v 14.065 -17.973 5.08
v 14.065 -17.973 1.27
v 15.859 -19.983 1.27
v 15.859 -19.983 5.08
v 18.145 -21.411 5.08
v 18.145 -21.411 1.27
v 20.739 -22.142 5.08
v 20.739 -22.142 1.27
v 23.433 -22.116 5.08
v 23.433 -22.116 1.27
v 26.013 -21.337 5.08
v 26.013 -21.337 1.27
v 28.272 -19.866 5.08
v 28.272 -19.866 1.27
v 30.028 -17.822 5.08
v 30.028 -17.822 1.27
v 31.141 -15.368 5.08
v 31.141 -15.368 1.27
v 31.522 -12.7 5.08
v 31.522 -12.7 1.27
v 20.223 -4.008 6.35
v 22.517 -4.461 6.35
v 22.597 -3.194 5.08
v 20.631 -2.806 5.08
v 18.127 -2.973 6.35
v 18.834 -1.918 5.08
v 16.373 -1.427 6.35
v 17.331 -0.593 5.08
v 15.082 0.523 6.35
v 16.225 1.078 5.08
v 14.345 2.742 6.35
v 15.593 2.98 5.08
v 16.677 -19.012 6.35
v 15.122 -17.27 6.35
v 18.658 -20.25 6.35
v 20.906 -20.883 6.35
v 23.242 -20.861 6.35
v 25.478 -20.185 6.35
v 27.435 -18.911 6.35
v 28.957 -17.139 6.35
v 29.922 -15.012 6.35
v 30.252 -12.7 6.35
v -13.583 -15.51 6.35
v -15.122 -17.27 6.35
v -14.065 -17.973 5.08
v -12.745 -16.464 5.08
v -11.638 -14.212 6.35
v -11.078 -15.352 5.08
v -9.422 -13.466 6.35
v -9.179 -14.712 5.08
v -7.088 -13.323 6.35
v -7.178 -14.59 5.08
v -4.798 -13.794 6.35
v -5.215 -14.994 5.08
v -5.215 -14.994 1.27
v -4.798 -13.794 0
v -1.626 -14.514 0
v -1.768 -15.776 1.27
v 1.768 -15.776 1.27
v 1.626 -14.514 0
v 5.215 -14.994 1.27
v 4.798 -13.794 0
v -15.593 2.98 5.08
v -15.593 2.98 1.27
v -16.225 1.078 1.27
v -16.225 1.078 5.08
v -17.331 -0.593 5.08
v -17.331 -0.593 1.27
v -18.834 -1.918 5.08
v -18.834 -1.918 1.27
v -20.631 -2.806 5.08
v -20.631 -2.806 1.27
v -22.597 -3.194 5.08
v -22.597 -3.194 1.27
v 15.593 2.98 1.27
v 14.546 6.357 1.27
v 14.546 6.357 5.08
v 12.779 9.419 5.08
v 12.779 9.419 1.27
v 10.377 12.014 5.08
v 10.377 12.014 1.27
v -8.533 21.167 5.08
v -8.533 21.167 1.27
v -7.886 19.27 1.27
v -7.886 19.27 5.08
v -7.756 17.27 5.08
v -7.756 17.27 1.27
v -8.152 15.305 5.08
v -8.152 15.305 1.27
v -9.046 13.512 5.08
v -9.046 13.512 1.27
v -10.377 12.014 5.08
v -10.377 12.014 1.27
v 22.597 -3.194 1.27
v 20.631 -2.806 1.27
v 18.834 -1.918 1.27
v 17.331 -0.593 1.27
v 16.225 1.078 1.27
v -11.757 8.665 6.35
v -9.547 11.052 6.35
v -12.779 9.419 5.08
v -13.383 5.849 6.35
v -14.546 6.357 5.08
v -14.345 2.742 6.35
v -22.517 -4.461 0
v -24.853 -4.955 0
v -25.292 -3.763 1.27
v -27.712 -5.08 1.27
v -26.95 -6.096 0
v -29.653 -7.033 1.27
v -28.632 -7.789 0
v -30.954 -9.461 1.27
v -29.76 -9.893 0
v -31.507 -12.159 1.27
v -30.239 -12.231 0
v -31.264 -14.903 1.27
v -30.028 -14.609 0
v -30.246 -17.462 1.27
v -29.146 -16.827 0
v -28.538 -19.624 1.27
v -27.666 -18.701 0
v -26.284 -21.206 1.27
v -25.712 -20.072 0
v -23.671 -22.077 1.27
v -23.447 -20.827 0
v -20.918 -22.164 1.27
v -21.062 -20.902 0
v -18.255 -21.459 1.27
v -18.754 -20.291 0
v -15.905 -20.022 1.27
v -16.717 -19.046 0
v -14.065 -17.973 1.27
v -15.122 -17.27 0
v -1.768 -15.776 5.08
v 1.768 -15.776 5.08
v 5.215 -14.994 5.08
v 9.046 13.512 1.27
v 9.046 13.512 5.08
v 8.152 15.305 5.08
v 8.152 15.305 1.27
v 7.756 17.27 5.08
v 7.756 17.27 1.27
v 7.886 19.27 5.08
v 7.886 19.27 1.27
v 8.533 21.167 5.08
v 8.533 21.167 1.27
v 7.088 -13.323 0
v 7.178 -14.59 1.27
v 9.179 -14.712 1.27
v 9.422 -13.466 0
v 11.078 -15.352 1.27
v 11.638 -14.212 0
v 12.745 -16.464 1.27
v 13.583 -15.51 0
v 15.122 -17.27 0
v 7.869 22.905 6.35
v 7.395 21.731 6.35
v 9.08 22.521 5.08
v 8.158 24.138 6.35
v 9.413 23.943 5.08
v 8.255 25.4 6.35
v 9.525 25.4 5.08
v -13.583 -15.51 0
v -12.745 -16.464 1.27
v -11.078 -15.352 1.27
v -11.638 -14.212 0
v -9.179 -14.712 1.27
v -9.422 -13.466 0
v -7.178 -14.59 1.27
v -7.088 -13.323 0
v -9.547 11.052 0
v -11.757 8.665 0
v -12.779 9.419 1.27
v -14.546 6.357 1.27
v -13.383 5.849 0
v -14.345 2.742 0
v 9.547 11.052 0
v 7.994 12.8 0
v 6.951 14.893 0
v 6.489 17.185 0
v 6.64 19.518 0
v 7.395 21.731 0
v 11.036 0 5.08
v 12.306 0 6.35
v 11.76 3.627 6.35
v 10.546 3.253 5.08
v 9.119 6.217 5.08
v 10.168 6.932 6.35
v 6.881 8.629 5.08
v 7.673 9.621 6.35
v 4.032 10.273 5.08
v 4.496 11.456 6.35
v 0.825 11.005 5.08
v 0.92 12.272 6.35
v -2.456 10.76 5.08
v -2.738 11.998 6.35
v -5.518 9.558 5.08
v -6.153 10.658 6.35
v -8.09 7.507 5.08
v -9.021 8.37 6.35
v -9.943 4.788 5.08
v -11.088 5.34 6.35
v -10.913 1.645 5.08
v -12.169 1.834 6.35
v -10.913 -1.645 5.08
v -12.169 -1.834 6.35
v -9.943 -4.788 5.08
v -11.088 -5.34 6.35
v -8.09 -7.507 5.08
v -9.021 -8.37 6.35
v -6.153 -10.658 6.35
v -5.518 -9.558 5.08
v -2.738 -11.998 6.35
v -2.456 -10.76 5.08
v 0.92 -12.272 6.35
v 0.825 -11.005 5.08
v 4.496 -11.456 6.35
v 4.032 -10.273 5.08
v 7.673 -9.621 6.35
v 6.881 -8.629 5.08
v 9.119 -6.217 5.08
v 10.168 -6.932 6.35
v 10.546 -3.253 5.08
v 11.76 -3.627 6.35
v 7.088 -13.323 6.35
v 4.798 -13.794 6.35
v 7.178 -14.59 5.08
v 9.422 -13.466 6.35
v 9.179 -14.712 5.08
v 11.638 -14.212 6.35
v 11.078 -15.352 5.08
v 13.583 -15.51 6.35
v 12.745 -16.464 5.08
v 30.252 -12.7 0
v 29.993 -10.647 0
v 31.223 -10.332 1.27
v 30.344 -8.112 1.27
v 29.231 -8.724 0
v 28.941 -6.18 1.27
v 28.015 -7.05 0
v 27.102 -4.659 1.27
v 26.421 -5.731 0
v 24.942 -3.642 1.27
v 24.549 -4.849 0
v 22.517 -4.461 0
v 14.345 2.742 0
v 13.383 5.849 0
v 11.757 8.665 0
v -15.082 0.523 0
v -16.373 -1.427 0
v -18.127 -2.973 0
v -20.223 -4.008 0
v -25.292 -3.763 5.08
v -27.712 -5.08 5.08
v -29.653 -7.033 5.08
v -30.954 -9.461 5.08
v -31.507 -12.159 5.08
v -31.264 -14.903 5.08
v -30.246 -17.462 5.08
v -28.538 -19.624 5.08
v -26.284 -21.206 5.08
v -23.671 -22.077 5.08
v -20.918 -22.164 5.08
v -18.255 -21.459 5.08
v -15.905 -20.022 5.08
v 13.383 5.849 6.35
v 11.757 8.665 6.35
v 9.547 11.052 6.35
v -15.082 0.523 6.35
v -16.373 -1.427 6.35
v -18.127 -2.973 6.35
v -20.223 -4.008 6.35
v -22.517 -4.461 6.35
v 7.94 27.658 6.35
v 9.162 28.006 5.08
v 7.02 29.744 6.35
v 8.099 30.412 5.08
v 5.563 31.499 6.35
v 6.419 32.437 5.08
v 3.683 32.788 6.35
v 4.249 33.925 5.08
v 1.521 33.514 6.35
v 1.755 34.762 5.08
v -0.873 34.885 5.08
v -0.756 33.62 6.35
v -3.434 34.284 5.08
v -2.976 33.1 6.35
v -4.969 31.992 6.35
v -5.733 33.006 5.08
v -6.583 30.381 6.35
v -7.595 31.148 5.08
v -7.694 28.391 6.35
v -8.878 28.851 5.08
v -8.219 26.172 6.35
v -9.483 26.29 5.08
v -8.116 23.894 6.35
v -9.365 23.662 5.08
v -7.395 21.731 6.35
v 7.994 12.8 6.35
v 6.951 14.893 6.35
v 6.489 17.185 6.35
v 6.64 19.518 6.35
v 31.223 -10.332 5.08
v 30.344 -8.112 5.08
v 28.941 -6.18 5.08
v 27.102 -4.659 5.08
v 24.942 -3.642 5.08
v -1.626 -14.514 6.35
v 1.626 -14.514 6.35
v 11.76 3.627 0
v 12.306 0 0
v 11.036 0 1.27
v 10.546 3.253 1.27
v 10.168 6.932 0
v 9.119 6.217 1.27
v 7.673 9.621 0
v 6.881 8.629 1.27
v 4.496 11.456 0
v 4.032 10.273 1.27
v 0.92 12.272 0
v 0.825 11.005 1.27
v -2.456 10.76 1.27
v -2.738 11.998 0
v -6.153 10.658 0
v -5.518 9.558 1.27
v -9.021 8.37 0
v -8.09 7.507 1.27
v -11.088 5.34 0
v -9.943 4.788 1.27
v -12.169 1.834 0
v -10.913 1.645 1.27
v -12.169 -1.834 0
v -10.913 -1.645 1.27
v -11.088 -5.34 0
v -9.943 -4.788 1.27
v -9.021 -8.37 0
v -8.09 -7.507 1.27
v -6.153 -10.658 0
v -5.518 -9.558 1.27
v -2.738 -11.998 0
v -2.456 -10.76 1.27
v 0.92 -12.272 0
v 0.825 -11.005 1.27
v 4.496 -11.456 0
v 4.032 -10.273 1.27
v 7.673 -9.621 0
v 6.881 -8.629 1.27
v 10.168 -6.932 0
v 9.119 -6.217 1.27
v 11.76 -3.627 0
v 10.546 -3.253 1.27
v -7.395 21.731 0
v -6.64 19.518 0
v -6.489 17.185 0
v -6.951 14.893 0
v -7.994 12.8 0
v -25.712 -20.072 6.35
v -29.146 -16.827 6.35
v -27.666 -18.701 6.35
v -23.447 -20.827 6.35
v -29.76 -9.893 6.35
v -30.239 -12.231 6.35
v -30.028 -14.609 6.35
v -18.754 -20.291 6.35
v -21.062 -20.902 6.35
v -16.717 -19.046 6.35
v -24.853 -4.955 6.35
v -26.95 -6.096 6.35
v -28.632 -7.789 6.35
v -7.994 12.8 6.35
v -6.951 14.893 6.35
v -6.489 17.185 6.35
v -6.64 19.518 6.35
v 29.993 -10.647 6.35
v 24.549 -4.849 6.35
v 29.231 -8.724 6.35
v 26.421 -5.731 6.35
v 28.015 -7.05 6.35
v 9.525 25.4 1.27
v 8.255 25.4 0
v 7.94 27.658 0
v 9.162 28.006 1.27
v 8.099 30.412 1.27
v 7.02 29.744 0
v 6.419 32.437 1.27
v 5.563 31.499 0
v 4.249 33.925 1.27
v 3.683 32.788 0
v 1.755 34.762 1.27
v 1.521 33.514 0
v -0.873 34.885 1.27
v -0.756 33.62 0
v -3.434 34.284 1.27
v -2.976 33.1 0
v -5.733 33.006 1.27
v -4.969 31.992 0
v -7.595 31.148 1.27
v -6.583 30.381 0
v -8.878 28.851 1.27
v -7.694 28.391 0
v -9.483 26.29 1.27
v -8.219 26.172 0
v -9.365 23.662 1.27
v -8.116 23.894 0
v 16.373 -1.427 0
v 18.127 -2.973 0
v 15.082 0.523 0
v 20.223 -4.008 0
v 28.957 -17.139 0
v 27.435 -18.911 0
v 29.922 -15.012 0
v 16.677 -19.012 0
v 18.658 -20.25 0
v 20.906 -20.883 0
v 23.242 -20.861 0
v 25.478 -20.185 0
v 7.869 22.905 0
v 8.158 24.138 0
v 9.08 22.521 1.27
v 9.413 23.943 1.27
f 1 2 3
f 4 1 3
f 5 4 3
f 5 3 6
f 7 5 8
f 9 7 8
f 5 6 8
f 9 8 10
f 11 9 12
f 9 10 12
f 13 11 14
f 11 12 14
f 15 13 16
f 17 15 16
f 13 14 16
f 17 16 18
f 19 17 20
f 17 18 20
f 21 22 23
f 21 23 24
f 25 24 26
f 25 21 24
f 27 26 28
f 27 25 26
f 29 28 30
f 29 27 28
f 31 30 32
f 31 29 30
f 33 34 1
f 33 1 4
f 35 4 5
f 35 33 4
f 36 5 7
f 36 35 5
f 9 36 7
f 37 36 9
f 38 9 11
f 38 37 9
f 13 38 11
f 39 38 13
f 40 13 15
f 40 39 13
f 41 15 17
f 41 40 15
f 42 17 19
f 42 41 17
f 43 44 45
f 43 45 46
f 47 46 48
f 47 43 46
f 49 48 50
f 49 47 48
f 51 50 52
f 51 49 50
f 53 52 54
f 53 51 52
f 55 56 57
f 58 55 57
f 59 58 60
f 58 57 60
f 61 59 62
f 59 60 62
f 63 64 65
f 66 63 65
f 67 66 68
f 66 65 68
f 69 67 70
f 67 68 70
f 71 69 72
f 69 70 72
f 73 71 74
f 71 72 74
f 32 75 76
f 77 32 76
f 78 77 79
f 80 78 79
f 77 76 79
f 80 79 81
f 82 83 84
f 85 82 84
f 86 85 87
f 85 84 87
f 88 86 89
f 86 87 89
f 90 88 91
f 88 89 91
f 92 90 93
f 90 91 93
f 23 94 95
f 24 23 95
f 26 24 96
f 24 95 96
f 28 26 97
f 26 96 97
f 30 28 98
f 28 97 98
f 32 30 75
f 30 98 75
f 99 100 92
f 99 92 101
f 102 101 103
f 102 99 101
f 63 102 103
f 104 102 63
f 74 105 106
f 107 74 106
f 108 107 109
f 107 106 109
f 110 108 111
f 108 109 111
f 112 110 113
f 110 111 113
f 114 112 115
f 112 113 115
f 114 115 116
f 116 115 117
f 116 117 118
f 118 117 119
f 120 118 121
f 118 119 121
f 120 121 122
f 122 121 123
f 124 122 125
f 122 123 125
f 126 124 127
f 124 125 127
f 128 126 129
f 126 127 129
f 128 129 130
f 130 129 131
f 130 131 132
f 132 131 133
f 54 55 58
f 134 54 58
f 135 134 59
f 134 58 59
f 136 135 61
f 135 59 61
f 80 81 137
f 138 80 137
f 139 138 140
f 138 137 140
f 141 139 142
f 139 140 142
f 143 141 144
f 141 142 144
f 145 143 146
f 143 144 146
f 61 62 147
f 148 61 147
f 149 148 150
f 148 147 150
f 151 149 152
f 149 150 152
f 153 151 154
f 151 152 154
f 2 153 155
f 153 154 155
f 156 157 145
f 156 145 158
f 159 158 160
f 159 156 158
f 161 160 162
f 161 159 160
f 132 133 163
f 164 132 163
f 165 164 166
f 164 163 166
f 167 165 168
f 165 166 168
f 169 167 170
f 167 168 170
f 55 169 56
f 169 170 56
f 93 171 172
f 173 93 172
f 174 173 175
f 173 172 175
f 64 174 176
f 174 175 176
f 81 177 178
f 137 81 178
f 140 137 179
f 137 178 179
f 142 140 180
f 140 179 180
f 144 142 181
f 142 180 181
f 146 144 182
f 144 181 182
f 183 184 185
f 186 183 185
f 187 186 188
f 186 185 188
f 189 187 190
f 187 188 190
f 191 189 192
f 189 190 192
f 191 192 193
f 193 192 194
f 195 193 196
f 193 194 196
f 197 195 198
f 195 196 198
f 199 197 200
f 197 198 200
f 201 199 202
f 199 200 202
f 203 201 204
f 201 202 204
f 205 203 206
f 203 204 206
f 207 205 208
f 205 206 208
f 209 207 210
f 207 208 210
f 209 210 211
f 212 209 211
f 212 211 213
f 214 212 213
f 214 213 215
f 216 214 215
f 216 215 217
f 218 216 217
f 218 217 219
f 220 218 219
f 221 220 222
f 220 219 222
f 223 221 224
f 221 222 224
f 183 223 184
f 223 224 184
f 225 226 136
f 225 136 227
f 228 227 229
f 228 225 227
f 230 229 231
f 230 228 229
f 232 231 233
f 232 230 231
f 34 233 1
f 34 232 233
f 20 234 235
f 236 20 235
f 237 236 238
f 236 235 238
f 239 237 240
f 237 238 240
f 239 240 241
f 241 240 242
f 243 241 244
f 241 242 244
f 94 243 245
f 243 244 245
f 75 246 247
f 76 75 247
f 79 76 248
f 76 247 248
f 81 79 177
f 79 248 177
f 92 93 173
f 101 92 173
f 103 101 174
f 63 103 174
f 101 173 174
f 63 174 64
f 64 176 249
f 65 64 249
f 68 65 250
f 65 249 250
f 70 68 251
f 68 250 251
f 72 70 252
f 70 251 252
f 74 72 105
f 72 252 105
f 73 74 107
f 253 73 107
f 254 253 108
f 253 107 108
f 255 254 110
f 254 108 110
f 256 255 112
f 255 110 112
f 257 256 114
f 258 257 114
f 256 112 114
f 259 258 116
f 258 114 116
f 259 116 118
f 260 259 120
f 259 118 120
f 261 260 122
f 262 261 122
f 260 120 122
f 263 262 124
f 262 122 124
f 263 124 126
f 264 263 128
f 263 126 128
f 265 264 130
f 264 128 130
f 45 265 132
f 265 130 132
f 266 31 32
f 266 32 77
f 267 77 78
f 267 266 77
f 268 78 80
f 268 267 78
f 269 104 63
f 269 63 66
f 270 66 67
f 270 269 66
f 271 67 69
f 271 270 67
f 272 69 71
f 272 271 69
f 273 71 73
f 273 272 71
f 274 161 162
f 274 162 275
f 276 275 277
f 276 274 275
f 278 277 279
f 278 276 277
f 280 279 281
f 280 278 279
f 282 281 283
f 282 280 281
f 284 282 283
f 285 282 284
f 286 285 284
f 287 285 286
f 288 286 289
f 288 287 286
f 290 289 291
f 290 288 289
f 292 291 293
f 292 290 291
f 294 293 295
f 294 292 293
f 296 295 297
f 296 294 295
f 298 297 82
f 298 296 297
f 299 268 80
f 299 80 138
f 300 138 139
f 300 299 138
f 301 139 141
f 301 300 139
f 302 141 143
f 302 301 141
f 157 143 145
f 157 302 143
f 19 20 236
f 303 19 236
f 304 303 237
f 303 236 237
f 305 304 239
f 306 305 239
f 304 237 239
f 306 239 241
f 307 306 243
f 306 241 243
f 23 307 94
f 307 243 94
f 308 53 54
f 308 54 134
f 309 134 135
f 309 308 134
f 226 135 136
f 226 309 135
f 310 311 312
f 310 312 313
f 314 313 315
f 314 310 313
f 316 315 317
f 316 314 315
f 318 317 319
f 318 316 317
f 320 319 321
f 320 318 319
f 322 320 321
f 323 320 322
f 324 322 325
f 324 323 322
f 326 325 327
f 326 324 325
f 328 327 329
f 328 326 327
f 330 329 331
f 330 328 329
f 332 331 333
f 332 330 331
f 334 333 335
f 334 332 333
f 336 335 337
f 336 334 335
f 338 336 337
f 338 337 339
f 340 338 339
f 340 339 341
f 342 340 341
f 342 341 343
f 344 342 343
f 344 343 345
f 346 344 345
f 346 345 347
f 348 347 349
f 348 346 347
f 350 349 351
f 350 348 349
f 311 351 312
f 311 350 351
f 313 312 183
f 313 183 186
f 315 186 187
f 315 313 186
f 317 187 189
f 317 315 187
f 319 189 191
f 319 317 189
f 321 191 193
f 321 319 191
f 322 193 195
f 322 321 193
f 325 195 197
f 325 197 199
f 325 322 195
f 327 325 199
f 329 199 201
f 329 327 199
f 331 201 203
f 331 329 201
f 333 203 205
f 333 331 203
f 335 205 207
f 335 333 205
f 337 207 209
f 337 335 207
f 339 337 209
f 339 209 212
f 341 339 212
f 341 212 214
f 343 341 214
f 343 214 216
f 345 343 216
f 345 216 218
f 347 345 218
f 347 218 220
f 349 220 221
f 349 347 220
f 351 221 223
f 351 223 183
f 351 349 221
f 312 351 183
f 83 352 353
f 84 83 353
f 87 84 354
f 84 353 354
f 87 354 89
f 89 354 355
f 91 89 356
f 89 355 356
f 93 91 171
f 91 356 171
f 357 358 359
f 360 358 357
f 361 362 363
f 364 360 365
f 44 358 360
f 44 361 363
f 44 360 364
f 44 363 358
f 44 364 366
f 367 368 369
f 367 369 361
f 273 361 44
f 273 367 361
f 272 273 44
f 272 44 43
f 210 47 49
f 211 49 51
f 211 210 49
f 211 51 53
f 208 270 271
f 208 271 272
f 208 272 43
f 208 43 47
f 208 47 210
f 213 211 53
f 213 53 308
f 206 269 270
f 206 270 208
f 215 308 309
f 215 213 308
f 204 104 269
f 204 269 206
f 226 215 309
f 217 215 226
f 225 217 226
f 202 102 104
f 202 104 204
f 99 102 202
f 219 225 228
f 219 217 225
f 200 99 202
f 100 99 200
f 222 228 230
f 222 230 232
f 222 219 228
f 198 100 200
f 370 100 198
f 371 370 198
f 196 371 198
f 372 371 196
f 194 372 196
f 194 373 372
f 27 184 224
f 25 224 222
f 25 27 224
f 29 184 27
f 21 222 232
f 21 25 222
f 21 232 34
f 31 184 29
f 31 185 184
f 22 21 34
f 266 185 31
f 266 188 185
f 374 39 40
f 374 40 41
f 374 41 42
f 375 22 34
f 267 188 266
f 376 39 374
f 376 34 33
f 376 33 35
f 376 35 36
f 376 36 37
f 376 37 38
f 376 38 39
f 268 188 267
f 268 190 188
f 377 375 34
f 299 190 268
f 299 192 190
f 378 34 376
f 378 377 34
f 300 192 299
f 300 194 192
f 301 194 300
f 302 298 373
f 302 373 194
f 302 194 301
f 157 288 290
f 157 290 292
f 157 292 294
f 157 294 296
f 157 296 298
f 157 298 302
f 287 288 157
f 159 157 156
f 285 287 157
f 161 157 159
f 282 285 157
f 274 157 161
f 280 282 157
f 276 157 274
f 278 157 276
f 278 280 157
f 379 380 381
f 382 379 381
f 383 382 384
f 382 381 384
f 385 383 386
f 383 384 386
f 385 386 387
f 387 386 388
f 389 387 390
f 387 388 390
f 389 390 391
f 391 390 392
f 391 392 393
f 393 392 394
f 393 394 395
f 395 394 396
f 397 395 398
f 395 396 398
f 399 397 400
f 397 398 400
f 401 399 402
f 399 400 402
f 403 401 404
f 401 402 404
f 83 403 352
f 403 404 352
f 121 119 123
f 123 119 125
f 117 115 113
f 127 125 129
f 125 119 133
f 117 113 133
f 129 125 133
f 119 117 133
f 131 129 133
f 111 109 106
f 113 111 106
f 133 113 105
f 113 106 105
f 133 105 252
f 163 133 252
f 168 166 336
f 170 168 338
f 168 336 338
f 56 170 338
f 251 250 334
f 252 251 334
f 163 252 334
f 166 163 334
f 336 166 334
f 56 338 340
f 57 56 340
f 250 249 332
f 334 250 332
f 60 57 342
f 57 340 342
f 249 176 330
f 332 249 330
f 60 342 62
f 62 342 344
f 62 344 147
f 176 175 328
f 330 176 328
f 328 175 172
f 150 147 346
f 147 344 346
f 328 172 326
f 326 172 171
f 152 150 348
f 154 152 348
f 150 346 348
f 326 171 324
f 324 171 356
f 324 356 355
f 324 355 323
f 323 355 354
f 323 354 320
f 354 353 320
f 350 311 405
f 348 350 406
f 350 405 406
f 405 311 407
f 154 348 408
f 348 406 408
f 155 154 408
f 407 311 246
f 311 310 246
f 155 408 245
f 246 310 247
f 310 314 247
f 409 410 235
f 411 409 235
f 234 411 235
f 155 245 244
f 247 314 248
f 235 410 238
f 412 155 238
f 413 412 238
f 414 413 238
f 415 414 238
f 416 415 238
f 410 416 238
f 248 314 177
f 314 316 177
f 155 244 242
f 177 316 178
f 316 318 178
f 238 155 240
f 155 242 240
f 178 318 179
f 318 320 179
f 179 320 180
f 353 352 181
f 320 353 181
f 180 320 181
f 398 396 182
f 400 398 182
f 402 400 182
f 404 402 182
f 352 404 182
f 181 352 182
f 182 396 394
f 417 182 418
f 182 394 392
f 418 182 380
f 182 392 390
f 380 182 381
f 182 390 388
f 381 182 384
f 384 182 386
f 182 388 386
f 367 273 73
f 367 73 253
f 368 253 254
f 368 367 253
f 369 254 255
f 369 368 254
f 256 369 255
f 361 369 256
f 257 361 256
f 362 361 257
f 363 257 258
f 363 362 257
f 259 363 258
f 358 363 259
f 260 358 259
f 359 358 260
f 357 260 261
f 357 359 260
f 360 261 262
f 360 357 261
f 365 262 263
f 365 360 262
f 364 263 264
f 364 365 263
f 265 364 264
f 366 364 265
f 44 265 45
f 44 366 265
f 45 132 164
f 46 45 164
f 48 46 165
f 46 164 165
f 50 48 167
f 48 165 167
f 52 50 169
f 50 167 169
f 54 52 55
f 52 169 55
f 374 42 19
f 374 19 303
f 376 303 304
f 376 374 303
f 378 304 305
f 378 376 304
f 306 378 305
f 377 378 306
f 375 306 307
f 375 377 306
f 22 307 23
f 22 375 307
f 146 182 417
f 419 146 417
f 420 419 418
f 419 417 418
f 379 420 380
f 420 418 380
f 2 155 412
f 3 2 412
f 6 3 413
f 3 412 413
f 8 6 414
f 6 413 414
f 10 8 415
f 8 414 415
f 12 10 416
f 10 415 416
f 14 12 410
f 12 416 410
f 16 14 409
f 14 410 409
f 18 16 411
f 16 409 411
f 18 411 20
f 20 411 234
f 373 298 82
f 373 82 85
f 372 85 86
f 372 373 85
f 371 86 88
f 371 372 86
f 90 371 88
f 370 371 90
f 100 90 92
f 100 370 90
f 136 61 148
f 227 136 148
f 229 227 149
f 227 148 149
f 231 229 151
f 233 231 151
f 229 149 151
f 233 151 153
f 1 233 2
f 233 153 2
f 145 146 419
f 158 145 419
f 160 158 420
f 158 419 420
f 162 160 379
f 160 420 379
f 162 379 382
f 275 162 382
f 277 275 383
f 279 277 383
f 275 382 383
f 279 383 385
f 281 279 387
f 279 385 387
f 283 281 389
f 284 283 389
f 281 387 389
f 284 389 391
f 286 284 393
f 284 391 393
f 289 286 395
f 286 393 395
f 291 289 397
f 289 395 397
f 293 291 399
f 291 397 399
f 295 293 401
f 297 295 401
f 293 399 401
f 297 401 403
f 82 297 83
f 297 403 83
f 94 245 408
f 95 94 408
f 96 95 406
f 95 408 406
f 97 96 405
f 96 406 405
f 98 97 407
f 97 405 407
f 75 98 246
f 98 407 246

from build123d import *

# Parameters (mm, degrees)
F0_R     = 11.0363
F1_DEPTH = 6.35
F2_SIZE  = 1.27


# Not quite as in the source:
# - a feature names something its author has since deleted; it is built from what else it names


with BuildPart() as f1:
    # F0 (on Top) → F1 (new body)
    with BuildSketch(Plane.XY):
        with BuildLine():
            ThreePointArc((13.7481534459, -7.9374997215), (15.334072534, -4.1087521857), (15.875, 0))
            ThreePointArc((15.875, 0), (15.8042735617, 1.4968507561), (15.592724449, 2.9803639471))
            ThreePointArc((15.592724449, 2.9803639471), (13.7481532851, 7.9375), (10.3774331152, 12.0135135135))
            ThreePointArc((10.3774331152, 12.0135135135), (5.5362937901, 14.8783425176), (-1.09e-08, 15.875))
            ThreePointArc((-1.09e-08, 15.875), (-5.5362938003, 14.8783425138), (-10.3774331152, 12.0135135135))
            ThreePointArc((-10.3774331152, 12.0135135135), (-13.7481532851, 7.9375), (-15.592724449, 2.9803639471))
            ThreePointArc((-15.592724449, 2.9803639471), (-15.6531695071, -2.6446000421), (-13.7481534335, -7.9374997429))
            ThreePointArc((-13.7481534335, -7.9374997429), (-10.1168758016, -12.2337422327), (-5.2152913338, -14.9938774606))
            ThreePointArc((-5.2152913338, -14.9938774606), (0, -15.875), (5.2152913338, -14.9938774606))
            ThreePointArc((5.2152913338, -14.9938774606), (10.1168758111, -12.2337422248), (13.7481534459, -7.9374997215))
        make_face()
        Circle(F0_R, mode=Mode.SUBTRACT)
        with BuildLine():
            ThreePointArc((15.592724449, 2.9803639471), (15.8042735617, 1.4968507561), (15.875, 0))
            ThreePointArc((15.875, 0), (15.334072534, -4.1087521857), (13.7481534459, -7.9374997215))
            ThreePointArc((13.7481534459, -7.9374997215), (17.4968931029, -4.3051053849), (22.5971491052, -3.1939229768))
            ThreePointArc((22.5971491052, -3.1939229768), (18.038469294, -1.3052898819), (15.592724449, 2.9803639471))
        make_face()
        with BuildLine():
            ThreePointArc((14.0645929883, -17.9727436898), (12.4767771707, -13.0002009006), (13.7481534459, -7.9374997215))
            ThreePointArc((13.7481534459, -7.9374997215), (10.1168758111, -12.2337422248), (5.2152913338, -14.9938774606))
            ThreePointArc((5.2152913338, -14.9938774606), (10.149648844, -14.9691277131), (14.0645929883, -17.9727436898))
        make_face()
        with BuildLine():
            ThreePointArc((22.5971491052, -3.1939229768), (17.4968931029, -4.3051053849), (13.7481534459, -7.9374997215))
            ThreePointArc((13.7481534459, -7.9374997215), (12.4767771707, -13.0002009006), (14.0645929883, -17.9727436898))
            ThreePointArc((14.0645929883, -17.9727436898), (24.751043908, -21.81817506), (31.5220452561, -12.7))
            ThreePointArc((31.5220452561, -12.7), (28.9411655806, -6.1804280878), (22.5971491052, -3.1939229768))
        make_face()
        with BuildLine():
            ThreePointArc((-1.09e-08, 15.875), (5.5362937901, 14.8783425176), (10.3774331152, 12.0135135135))
            ThreePointArc((10.3774331152, 12.0135135135), (7.88882045, 16.274417595), (8.5325561169, 21.1666666667))
            ThreePointArc((8.5325561169, 21.1666666667), (5.0201157809, 17.3053065193), (-1.09e-08, 15.875))
        make_face()
        with BuildLine():
            ThreePointArc((-10.3774331152, 12.0135135135), (-5.5362938003, 14.8783425138), (-1.09e-08, 15.875))
            ThreePointArc((-1.09e-08, 15.875), (-5.0201157901, 17.305306525), (-8.5325561169, 21.1666666667))
            ThreePointArc((-8.5325561169, 21.1666666667), (-7.88882045, 16.274417595), (-10.3774331152, 12.0135135135))
        make_face()
        with BuildLine():
            ThreePointArc((-8.5325561169, 21.1666666667), (-5.0201157901, 17.305306525), (-1.09e-08, 15.875))
            ThreePointArc((-1.09e-08, 15.875), (5.0201157809, 17.3053065193), (8.5325561169, 21.1666666667))
            ThreePointArc((8.5325561169, 21.1666666667), (9.2735705641, 23.2259452645), (9.525, 25.4))
            ThreePointArc((9.525, 25.4), (-2.1740547355, 34.6735705641), (-8.5325561169, 21.1666666667))
        make_face()
        with BuildLine():
            ThreePointArc((-14.0645929883, -17.9727436898), (-10.149648844, -14.9691277131), (-5.2152913338, -14.9938774606))
            ThreePointArc((-5.2152913338, -14.9938774606), (-10.1168758016, -12.2337422327), (-13.7481534335, -7.9374997429))
            ThreePointArc((-13.7481534335, -7.9374997429), (-12.7966017991, -10.234748452), (-12.4720452561, -12.7))
            ThreePointArc((-12.4720452561, -12.7), (-12.8788701961, -15.4539986519), (-14.0645929883, -17.9727436898))
        make_face()
        with BuildLine():
            ThreePointArc((-22.5971491052, -3.1939229768), (-17.496893092, -4.3051053908), (-13.7481534335, -7.9374997429))
            ThreePointArc((-13.7481534335, -7.9374997429), (-15.6531695071, -2.6446000421), (-15.592724449, 2.9803639471))
            ThreePointArc((-15.592724449, 2.9803639471), (-18.038469294, -1.3052898819), (-22.5971491052, -3.1939229768))
        make_face()
        with BuildLine():
            ThreePointArc((-12.4720452561, -12.7), (-12.7966017991, -10.234748452), (-13.7481534335, -7.9374997429))
            ThreePointArc((-13.7481534335, -7.9374997429), (-17.496893092, -4.3051053908), (-22.5971491052, -3.1939229768))
            ThreePointArc((-22.5971491052, -3.1939229768), (-30.2459372272, -17.4625), (-14.0645929883, -17.9727436898))
            ThreePointArc((-14.0645929883, -17.9727436898), (-12.8788701961, -15.4539986519), (-12.4720452561, -12.7))
        make_face()
    extrude(amount=F1_DEPTH)

    # F2
    f2_edges = [f1.edges().sort_by_distance(p)[0] for p in [
        (13.748153, 7.9375, 0),
        (7.88882, 16.274418, 0),
        (0, 34.925, 0),
        (-7.88882, 16.274418, 0),
        (-13.748153, 7.9375, 0),
        (-18.038469, -1.30529, 0),
        (-30.245937, -17.4625, 0),
        (-10.149649, -14.969128, 0),
        (0, -15.875, 0),
        (10.149649, -14.969128, 0),
        (30.245937, -17.4625, 0),
        (18.038469, -1.30529, 0),
        (-11.0363, 0, 0),
        (13.748153, 7.9375, 6.35),
        (7.88882, 16.274418, 6.35),
        (0, 34.925, 6.35),
        (-7.88882, 16.274418, 6.35),
        (-13.748153, 7.9375, 6.35),
        (-18.038469, -1.30529, 6.35),
        (-30.245937, -17.4625, 6.35),
        (-10.149649, -14.969128, 6.35),
        (0, -15.875, 6.35),
        (10.149649, -14.969128, 6.35),
        (30.245937, -17.4625, 6.35),
        (18.038469, -1.30529, 6.35),
        (-11.0363, 0, 6.35),
    ]]
    chamfer(f2_edges, length=F2_SIZE)


solid = f1.part
